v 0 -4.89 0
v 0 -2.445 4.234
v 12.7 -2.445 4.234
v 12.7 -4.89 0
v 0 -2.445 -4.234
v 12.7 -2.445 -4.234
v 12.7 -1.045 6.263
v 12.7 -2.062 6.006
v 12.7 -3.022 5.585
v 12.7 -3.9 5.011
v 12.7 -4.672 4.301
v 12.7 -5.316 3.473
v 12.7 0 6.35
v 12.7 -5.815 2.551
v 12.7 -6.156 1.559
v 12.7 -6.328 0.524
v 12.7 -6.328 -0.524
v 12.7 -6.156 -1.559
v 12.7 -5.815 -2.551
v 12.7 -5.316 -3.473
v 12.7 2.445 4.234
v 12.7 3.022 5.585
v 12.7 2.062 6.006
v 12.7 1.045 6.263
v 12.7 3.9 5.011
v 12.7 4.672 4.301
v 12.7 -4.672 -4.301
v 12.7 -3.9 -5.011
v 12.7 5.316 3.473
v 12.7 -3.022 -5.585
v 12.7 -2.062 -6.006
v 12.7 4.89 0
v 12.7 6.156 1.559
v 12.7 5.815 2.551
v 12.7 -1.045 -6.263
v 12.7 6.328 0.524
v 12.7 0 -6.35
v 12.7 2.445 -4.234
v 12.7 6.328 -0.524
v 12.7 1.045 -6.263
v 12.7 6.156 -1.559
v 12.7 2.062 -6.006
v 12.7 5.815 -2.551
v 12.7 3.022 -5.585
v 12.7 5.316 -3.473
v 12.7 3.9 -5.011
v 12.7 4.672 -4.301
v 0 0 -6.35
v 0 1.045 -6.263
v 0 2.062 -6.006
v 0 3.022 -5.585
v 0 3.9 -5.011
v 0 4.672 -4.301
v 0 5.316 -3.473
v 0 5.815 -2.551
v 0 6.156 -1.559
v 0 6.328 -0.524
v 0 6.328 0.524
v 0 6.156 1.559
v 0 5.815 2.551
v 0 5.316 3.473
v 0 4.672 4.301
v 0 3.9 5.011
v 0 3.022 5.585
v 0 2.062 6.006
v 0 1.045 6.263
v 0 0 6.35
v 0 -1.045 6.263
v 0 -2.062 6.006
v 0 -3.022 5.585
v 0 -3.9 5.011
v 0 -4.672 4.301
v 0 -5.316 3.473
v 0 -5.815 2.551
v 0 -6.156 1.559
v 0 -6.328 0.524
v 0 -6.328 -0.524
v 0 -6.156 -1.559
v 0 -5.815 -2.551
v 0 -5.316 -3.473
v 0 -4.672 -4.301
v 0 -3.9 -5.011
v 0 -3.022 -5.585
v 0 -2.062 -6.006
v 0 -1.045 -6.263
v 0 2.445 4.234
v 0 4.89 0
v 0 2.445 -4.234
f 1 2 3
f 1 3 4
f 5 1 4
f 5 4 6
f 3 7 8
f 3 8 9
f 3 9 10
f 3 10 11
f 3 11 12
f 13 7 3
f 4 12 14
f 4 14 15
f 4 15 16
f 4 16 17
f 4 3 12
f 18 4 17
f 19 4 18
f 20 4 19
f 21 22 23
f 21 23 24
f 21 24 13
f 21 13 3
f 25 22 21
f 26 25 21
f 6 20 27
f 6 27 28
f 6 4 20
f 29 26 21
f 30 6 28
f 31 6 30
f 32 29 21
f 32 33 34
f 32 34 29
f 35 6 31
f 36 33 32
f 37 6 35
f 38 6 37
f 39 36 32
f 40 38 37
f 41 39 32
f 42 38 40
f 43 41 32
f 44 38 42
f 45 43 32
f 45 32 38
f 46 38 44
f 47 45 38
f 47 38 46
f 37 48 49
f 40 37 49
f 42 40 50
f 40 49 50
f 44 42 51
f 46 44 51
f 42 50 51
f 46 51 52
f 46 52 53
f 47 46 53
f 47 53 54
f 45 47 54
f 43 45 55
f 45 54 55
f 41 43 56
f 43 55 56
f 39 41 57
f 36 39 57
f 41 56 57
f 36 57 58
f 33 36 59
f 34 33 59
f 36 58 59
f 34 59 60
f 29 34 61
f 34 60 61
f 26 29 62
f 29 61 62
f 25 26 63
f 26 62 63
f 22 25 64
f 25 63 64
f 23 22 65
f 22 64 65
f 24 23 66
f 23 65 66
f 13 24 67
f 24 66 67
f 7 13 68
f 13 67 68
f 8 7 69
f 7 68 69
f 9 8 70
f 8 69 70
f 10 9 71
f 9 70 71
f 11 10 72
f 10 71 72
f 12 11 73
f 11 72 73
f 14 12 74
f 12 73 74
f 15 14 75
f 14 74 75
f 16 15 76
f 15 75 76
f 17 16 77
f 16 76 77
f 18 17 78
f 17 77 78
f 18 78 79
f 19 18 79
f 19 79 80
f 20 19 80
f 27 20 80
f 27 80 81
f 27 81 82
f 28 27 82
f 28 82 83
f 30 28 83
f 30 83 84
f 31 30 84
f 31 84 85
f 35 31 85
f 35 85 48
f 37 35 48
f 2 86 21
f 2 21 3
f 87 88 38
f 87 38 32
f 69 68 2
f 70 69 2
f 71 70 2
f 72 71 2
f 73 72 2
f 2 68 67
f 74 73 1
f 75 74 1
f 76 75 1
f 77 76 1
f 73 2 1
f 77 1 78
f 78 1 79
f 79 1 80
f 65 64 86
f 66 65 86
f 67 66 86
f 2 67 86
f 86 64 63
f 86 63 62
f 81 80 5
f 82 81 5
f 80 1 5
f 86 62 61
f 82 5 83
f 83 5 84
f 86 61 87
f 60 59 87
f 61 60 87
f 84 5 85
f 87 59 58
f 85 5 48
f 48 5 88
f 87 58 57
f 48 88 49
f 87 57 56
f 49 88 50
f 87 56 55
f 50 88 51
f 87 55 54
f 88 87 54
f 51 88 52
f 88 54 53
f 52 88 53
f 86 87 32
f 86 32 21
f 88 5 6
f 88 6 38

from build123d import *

# Parameters (mm, degrees)
BUSHING_PROFILE_R = 6.35
BUSHING_DEPTH     = 12.7


with BuildPart() as part:
    # Bushing Profile → Bushing (new body)
    with BuildSketch(Plane(origin=(0, 0, 0), x_dir=(0, 0, -1), z_dir=(1, 0, 0))):
        Circle(BUSHING_PROFILE_R)
        Polygon((0, -4.8895), (4.234431212, -2.44475), (4.234431212, 2.44475), (0, 4.8895), (-4.234431212, 2.44475), (-4.234431212, -2.44475), align=None, mode=Mode.SUBTRACT)
    extrude(amount=BUSHING_DEPTH)


solid = part.part
